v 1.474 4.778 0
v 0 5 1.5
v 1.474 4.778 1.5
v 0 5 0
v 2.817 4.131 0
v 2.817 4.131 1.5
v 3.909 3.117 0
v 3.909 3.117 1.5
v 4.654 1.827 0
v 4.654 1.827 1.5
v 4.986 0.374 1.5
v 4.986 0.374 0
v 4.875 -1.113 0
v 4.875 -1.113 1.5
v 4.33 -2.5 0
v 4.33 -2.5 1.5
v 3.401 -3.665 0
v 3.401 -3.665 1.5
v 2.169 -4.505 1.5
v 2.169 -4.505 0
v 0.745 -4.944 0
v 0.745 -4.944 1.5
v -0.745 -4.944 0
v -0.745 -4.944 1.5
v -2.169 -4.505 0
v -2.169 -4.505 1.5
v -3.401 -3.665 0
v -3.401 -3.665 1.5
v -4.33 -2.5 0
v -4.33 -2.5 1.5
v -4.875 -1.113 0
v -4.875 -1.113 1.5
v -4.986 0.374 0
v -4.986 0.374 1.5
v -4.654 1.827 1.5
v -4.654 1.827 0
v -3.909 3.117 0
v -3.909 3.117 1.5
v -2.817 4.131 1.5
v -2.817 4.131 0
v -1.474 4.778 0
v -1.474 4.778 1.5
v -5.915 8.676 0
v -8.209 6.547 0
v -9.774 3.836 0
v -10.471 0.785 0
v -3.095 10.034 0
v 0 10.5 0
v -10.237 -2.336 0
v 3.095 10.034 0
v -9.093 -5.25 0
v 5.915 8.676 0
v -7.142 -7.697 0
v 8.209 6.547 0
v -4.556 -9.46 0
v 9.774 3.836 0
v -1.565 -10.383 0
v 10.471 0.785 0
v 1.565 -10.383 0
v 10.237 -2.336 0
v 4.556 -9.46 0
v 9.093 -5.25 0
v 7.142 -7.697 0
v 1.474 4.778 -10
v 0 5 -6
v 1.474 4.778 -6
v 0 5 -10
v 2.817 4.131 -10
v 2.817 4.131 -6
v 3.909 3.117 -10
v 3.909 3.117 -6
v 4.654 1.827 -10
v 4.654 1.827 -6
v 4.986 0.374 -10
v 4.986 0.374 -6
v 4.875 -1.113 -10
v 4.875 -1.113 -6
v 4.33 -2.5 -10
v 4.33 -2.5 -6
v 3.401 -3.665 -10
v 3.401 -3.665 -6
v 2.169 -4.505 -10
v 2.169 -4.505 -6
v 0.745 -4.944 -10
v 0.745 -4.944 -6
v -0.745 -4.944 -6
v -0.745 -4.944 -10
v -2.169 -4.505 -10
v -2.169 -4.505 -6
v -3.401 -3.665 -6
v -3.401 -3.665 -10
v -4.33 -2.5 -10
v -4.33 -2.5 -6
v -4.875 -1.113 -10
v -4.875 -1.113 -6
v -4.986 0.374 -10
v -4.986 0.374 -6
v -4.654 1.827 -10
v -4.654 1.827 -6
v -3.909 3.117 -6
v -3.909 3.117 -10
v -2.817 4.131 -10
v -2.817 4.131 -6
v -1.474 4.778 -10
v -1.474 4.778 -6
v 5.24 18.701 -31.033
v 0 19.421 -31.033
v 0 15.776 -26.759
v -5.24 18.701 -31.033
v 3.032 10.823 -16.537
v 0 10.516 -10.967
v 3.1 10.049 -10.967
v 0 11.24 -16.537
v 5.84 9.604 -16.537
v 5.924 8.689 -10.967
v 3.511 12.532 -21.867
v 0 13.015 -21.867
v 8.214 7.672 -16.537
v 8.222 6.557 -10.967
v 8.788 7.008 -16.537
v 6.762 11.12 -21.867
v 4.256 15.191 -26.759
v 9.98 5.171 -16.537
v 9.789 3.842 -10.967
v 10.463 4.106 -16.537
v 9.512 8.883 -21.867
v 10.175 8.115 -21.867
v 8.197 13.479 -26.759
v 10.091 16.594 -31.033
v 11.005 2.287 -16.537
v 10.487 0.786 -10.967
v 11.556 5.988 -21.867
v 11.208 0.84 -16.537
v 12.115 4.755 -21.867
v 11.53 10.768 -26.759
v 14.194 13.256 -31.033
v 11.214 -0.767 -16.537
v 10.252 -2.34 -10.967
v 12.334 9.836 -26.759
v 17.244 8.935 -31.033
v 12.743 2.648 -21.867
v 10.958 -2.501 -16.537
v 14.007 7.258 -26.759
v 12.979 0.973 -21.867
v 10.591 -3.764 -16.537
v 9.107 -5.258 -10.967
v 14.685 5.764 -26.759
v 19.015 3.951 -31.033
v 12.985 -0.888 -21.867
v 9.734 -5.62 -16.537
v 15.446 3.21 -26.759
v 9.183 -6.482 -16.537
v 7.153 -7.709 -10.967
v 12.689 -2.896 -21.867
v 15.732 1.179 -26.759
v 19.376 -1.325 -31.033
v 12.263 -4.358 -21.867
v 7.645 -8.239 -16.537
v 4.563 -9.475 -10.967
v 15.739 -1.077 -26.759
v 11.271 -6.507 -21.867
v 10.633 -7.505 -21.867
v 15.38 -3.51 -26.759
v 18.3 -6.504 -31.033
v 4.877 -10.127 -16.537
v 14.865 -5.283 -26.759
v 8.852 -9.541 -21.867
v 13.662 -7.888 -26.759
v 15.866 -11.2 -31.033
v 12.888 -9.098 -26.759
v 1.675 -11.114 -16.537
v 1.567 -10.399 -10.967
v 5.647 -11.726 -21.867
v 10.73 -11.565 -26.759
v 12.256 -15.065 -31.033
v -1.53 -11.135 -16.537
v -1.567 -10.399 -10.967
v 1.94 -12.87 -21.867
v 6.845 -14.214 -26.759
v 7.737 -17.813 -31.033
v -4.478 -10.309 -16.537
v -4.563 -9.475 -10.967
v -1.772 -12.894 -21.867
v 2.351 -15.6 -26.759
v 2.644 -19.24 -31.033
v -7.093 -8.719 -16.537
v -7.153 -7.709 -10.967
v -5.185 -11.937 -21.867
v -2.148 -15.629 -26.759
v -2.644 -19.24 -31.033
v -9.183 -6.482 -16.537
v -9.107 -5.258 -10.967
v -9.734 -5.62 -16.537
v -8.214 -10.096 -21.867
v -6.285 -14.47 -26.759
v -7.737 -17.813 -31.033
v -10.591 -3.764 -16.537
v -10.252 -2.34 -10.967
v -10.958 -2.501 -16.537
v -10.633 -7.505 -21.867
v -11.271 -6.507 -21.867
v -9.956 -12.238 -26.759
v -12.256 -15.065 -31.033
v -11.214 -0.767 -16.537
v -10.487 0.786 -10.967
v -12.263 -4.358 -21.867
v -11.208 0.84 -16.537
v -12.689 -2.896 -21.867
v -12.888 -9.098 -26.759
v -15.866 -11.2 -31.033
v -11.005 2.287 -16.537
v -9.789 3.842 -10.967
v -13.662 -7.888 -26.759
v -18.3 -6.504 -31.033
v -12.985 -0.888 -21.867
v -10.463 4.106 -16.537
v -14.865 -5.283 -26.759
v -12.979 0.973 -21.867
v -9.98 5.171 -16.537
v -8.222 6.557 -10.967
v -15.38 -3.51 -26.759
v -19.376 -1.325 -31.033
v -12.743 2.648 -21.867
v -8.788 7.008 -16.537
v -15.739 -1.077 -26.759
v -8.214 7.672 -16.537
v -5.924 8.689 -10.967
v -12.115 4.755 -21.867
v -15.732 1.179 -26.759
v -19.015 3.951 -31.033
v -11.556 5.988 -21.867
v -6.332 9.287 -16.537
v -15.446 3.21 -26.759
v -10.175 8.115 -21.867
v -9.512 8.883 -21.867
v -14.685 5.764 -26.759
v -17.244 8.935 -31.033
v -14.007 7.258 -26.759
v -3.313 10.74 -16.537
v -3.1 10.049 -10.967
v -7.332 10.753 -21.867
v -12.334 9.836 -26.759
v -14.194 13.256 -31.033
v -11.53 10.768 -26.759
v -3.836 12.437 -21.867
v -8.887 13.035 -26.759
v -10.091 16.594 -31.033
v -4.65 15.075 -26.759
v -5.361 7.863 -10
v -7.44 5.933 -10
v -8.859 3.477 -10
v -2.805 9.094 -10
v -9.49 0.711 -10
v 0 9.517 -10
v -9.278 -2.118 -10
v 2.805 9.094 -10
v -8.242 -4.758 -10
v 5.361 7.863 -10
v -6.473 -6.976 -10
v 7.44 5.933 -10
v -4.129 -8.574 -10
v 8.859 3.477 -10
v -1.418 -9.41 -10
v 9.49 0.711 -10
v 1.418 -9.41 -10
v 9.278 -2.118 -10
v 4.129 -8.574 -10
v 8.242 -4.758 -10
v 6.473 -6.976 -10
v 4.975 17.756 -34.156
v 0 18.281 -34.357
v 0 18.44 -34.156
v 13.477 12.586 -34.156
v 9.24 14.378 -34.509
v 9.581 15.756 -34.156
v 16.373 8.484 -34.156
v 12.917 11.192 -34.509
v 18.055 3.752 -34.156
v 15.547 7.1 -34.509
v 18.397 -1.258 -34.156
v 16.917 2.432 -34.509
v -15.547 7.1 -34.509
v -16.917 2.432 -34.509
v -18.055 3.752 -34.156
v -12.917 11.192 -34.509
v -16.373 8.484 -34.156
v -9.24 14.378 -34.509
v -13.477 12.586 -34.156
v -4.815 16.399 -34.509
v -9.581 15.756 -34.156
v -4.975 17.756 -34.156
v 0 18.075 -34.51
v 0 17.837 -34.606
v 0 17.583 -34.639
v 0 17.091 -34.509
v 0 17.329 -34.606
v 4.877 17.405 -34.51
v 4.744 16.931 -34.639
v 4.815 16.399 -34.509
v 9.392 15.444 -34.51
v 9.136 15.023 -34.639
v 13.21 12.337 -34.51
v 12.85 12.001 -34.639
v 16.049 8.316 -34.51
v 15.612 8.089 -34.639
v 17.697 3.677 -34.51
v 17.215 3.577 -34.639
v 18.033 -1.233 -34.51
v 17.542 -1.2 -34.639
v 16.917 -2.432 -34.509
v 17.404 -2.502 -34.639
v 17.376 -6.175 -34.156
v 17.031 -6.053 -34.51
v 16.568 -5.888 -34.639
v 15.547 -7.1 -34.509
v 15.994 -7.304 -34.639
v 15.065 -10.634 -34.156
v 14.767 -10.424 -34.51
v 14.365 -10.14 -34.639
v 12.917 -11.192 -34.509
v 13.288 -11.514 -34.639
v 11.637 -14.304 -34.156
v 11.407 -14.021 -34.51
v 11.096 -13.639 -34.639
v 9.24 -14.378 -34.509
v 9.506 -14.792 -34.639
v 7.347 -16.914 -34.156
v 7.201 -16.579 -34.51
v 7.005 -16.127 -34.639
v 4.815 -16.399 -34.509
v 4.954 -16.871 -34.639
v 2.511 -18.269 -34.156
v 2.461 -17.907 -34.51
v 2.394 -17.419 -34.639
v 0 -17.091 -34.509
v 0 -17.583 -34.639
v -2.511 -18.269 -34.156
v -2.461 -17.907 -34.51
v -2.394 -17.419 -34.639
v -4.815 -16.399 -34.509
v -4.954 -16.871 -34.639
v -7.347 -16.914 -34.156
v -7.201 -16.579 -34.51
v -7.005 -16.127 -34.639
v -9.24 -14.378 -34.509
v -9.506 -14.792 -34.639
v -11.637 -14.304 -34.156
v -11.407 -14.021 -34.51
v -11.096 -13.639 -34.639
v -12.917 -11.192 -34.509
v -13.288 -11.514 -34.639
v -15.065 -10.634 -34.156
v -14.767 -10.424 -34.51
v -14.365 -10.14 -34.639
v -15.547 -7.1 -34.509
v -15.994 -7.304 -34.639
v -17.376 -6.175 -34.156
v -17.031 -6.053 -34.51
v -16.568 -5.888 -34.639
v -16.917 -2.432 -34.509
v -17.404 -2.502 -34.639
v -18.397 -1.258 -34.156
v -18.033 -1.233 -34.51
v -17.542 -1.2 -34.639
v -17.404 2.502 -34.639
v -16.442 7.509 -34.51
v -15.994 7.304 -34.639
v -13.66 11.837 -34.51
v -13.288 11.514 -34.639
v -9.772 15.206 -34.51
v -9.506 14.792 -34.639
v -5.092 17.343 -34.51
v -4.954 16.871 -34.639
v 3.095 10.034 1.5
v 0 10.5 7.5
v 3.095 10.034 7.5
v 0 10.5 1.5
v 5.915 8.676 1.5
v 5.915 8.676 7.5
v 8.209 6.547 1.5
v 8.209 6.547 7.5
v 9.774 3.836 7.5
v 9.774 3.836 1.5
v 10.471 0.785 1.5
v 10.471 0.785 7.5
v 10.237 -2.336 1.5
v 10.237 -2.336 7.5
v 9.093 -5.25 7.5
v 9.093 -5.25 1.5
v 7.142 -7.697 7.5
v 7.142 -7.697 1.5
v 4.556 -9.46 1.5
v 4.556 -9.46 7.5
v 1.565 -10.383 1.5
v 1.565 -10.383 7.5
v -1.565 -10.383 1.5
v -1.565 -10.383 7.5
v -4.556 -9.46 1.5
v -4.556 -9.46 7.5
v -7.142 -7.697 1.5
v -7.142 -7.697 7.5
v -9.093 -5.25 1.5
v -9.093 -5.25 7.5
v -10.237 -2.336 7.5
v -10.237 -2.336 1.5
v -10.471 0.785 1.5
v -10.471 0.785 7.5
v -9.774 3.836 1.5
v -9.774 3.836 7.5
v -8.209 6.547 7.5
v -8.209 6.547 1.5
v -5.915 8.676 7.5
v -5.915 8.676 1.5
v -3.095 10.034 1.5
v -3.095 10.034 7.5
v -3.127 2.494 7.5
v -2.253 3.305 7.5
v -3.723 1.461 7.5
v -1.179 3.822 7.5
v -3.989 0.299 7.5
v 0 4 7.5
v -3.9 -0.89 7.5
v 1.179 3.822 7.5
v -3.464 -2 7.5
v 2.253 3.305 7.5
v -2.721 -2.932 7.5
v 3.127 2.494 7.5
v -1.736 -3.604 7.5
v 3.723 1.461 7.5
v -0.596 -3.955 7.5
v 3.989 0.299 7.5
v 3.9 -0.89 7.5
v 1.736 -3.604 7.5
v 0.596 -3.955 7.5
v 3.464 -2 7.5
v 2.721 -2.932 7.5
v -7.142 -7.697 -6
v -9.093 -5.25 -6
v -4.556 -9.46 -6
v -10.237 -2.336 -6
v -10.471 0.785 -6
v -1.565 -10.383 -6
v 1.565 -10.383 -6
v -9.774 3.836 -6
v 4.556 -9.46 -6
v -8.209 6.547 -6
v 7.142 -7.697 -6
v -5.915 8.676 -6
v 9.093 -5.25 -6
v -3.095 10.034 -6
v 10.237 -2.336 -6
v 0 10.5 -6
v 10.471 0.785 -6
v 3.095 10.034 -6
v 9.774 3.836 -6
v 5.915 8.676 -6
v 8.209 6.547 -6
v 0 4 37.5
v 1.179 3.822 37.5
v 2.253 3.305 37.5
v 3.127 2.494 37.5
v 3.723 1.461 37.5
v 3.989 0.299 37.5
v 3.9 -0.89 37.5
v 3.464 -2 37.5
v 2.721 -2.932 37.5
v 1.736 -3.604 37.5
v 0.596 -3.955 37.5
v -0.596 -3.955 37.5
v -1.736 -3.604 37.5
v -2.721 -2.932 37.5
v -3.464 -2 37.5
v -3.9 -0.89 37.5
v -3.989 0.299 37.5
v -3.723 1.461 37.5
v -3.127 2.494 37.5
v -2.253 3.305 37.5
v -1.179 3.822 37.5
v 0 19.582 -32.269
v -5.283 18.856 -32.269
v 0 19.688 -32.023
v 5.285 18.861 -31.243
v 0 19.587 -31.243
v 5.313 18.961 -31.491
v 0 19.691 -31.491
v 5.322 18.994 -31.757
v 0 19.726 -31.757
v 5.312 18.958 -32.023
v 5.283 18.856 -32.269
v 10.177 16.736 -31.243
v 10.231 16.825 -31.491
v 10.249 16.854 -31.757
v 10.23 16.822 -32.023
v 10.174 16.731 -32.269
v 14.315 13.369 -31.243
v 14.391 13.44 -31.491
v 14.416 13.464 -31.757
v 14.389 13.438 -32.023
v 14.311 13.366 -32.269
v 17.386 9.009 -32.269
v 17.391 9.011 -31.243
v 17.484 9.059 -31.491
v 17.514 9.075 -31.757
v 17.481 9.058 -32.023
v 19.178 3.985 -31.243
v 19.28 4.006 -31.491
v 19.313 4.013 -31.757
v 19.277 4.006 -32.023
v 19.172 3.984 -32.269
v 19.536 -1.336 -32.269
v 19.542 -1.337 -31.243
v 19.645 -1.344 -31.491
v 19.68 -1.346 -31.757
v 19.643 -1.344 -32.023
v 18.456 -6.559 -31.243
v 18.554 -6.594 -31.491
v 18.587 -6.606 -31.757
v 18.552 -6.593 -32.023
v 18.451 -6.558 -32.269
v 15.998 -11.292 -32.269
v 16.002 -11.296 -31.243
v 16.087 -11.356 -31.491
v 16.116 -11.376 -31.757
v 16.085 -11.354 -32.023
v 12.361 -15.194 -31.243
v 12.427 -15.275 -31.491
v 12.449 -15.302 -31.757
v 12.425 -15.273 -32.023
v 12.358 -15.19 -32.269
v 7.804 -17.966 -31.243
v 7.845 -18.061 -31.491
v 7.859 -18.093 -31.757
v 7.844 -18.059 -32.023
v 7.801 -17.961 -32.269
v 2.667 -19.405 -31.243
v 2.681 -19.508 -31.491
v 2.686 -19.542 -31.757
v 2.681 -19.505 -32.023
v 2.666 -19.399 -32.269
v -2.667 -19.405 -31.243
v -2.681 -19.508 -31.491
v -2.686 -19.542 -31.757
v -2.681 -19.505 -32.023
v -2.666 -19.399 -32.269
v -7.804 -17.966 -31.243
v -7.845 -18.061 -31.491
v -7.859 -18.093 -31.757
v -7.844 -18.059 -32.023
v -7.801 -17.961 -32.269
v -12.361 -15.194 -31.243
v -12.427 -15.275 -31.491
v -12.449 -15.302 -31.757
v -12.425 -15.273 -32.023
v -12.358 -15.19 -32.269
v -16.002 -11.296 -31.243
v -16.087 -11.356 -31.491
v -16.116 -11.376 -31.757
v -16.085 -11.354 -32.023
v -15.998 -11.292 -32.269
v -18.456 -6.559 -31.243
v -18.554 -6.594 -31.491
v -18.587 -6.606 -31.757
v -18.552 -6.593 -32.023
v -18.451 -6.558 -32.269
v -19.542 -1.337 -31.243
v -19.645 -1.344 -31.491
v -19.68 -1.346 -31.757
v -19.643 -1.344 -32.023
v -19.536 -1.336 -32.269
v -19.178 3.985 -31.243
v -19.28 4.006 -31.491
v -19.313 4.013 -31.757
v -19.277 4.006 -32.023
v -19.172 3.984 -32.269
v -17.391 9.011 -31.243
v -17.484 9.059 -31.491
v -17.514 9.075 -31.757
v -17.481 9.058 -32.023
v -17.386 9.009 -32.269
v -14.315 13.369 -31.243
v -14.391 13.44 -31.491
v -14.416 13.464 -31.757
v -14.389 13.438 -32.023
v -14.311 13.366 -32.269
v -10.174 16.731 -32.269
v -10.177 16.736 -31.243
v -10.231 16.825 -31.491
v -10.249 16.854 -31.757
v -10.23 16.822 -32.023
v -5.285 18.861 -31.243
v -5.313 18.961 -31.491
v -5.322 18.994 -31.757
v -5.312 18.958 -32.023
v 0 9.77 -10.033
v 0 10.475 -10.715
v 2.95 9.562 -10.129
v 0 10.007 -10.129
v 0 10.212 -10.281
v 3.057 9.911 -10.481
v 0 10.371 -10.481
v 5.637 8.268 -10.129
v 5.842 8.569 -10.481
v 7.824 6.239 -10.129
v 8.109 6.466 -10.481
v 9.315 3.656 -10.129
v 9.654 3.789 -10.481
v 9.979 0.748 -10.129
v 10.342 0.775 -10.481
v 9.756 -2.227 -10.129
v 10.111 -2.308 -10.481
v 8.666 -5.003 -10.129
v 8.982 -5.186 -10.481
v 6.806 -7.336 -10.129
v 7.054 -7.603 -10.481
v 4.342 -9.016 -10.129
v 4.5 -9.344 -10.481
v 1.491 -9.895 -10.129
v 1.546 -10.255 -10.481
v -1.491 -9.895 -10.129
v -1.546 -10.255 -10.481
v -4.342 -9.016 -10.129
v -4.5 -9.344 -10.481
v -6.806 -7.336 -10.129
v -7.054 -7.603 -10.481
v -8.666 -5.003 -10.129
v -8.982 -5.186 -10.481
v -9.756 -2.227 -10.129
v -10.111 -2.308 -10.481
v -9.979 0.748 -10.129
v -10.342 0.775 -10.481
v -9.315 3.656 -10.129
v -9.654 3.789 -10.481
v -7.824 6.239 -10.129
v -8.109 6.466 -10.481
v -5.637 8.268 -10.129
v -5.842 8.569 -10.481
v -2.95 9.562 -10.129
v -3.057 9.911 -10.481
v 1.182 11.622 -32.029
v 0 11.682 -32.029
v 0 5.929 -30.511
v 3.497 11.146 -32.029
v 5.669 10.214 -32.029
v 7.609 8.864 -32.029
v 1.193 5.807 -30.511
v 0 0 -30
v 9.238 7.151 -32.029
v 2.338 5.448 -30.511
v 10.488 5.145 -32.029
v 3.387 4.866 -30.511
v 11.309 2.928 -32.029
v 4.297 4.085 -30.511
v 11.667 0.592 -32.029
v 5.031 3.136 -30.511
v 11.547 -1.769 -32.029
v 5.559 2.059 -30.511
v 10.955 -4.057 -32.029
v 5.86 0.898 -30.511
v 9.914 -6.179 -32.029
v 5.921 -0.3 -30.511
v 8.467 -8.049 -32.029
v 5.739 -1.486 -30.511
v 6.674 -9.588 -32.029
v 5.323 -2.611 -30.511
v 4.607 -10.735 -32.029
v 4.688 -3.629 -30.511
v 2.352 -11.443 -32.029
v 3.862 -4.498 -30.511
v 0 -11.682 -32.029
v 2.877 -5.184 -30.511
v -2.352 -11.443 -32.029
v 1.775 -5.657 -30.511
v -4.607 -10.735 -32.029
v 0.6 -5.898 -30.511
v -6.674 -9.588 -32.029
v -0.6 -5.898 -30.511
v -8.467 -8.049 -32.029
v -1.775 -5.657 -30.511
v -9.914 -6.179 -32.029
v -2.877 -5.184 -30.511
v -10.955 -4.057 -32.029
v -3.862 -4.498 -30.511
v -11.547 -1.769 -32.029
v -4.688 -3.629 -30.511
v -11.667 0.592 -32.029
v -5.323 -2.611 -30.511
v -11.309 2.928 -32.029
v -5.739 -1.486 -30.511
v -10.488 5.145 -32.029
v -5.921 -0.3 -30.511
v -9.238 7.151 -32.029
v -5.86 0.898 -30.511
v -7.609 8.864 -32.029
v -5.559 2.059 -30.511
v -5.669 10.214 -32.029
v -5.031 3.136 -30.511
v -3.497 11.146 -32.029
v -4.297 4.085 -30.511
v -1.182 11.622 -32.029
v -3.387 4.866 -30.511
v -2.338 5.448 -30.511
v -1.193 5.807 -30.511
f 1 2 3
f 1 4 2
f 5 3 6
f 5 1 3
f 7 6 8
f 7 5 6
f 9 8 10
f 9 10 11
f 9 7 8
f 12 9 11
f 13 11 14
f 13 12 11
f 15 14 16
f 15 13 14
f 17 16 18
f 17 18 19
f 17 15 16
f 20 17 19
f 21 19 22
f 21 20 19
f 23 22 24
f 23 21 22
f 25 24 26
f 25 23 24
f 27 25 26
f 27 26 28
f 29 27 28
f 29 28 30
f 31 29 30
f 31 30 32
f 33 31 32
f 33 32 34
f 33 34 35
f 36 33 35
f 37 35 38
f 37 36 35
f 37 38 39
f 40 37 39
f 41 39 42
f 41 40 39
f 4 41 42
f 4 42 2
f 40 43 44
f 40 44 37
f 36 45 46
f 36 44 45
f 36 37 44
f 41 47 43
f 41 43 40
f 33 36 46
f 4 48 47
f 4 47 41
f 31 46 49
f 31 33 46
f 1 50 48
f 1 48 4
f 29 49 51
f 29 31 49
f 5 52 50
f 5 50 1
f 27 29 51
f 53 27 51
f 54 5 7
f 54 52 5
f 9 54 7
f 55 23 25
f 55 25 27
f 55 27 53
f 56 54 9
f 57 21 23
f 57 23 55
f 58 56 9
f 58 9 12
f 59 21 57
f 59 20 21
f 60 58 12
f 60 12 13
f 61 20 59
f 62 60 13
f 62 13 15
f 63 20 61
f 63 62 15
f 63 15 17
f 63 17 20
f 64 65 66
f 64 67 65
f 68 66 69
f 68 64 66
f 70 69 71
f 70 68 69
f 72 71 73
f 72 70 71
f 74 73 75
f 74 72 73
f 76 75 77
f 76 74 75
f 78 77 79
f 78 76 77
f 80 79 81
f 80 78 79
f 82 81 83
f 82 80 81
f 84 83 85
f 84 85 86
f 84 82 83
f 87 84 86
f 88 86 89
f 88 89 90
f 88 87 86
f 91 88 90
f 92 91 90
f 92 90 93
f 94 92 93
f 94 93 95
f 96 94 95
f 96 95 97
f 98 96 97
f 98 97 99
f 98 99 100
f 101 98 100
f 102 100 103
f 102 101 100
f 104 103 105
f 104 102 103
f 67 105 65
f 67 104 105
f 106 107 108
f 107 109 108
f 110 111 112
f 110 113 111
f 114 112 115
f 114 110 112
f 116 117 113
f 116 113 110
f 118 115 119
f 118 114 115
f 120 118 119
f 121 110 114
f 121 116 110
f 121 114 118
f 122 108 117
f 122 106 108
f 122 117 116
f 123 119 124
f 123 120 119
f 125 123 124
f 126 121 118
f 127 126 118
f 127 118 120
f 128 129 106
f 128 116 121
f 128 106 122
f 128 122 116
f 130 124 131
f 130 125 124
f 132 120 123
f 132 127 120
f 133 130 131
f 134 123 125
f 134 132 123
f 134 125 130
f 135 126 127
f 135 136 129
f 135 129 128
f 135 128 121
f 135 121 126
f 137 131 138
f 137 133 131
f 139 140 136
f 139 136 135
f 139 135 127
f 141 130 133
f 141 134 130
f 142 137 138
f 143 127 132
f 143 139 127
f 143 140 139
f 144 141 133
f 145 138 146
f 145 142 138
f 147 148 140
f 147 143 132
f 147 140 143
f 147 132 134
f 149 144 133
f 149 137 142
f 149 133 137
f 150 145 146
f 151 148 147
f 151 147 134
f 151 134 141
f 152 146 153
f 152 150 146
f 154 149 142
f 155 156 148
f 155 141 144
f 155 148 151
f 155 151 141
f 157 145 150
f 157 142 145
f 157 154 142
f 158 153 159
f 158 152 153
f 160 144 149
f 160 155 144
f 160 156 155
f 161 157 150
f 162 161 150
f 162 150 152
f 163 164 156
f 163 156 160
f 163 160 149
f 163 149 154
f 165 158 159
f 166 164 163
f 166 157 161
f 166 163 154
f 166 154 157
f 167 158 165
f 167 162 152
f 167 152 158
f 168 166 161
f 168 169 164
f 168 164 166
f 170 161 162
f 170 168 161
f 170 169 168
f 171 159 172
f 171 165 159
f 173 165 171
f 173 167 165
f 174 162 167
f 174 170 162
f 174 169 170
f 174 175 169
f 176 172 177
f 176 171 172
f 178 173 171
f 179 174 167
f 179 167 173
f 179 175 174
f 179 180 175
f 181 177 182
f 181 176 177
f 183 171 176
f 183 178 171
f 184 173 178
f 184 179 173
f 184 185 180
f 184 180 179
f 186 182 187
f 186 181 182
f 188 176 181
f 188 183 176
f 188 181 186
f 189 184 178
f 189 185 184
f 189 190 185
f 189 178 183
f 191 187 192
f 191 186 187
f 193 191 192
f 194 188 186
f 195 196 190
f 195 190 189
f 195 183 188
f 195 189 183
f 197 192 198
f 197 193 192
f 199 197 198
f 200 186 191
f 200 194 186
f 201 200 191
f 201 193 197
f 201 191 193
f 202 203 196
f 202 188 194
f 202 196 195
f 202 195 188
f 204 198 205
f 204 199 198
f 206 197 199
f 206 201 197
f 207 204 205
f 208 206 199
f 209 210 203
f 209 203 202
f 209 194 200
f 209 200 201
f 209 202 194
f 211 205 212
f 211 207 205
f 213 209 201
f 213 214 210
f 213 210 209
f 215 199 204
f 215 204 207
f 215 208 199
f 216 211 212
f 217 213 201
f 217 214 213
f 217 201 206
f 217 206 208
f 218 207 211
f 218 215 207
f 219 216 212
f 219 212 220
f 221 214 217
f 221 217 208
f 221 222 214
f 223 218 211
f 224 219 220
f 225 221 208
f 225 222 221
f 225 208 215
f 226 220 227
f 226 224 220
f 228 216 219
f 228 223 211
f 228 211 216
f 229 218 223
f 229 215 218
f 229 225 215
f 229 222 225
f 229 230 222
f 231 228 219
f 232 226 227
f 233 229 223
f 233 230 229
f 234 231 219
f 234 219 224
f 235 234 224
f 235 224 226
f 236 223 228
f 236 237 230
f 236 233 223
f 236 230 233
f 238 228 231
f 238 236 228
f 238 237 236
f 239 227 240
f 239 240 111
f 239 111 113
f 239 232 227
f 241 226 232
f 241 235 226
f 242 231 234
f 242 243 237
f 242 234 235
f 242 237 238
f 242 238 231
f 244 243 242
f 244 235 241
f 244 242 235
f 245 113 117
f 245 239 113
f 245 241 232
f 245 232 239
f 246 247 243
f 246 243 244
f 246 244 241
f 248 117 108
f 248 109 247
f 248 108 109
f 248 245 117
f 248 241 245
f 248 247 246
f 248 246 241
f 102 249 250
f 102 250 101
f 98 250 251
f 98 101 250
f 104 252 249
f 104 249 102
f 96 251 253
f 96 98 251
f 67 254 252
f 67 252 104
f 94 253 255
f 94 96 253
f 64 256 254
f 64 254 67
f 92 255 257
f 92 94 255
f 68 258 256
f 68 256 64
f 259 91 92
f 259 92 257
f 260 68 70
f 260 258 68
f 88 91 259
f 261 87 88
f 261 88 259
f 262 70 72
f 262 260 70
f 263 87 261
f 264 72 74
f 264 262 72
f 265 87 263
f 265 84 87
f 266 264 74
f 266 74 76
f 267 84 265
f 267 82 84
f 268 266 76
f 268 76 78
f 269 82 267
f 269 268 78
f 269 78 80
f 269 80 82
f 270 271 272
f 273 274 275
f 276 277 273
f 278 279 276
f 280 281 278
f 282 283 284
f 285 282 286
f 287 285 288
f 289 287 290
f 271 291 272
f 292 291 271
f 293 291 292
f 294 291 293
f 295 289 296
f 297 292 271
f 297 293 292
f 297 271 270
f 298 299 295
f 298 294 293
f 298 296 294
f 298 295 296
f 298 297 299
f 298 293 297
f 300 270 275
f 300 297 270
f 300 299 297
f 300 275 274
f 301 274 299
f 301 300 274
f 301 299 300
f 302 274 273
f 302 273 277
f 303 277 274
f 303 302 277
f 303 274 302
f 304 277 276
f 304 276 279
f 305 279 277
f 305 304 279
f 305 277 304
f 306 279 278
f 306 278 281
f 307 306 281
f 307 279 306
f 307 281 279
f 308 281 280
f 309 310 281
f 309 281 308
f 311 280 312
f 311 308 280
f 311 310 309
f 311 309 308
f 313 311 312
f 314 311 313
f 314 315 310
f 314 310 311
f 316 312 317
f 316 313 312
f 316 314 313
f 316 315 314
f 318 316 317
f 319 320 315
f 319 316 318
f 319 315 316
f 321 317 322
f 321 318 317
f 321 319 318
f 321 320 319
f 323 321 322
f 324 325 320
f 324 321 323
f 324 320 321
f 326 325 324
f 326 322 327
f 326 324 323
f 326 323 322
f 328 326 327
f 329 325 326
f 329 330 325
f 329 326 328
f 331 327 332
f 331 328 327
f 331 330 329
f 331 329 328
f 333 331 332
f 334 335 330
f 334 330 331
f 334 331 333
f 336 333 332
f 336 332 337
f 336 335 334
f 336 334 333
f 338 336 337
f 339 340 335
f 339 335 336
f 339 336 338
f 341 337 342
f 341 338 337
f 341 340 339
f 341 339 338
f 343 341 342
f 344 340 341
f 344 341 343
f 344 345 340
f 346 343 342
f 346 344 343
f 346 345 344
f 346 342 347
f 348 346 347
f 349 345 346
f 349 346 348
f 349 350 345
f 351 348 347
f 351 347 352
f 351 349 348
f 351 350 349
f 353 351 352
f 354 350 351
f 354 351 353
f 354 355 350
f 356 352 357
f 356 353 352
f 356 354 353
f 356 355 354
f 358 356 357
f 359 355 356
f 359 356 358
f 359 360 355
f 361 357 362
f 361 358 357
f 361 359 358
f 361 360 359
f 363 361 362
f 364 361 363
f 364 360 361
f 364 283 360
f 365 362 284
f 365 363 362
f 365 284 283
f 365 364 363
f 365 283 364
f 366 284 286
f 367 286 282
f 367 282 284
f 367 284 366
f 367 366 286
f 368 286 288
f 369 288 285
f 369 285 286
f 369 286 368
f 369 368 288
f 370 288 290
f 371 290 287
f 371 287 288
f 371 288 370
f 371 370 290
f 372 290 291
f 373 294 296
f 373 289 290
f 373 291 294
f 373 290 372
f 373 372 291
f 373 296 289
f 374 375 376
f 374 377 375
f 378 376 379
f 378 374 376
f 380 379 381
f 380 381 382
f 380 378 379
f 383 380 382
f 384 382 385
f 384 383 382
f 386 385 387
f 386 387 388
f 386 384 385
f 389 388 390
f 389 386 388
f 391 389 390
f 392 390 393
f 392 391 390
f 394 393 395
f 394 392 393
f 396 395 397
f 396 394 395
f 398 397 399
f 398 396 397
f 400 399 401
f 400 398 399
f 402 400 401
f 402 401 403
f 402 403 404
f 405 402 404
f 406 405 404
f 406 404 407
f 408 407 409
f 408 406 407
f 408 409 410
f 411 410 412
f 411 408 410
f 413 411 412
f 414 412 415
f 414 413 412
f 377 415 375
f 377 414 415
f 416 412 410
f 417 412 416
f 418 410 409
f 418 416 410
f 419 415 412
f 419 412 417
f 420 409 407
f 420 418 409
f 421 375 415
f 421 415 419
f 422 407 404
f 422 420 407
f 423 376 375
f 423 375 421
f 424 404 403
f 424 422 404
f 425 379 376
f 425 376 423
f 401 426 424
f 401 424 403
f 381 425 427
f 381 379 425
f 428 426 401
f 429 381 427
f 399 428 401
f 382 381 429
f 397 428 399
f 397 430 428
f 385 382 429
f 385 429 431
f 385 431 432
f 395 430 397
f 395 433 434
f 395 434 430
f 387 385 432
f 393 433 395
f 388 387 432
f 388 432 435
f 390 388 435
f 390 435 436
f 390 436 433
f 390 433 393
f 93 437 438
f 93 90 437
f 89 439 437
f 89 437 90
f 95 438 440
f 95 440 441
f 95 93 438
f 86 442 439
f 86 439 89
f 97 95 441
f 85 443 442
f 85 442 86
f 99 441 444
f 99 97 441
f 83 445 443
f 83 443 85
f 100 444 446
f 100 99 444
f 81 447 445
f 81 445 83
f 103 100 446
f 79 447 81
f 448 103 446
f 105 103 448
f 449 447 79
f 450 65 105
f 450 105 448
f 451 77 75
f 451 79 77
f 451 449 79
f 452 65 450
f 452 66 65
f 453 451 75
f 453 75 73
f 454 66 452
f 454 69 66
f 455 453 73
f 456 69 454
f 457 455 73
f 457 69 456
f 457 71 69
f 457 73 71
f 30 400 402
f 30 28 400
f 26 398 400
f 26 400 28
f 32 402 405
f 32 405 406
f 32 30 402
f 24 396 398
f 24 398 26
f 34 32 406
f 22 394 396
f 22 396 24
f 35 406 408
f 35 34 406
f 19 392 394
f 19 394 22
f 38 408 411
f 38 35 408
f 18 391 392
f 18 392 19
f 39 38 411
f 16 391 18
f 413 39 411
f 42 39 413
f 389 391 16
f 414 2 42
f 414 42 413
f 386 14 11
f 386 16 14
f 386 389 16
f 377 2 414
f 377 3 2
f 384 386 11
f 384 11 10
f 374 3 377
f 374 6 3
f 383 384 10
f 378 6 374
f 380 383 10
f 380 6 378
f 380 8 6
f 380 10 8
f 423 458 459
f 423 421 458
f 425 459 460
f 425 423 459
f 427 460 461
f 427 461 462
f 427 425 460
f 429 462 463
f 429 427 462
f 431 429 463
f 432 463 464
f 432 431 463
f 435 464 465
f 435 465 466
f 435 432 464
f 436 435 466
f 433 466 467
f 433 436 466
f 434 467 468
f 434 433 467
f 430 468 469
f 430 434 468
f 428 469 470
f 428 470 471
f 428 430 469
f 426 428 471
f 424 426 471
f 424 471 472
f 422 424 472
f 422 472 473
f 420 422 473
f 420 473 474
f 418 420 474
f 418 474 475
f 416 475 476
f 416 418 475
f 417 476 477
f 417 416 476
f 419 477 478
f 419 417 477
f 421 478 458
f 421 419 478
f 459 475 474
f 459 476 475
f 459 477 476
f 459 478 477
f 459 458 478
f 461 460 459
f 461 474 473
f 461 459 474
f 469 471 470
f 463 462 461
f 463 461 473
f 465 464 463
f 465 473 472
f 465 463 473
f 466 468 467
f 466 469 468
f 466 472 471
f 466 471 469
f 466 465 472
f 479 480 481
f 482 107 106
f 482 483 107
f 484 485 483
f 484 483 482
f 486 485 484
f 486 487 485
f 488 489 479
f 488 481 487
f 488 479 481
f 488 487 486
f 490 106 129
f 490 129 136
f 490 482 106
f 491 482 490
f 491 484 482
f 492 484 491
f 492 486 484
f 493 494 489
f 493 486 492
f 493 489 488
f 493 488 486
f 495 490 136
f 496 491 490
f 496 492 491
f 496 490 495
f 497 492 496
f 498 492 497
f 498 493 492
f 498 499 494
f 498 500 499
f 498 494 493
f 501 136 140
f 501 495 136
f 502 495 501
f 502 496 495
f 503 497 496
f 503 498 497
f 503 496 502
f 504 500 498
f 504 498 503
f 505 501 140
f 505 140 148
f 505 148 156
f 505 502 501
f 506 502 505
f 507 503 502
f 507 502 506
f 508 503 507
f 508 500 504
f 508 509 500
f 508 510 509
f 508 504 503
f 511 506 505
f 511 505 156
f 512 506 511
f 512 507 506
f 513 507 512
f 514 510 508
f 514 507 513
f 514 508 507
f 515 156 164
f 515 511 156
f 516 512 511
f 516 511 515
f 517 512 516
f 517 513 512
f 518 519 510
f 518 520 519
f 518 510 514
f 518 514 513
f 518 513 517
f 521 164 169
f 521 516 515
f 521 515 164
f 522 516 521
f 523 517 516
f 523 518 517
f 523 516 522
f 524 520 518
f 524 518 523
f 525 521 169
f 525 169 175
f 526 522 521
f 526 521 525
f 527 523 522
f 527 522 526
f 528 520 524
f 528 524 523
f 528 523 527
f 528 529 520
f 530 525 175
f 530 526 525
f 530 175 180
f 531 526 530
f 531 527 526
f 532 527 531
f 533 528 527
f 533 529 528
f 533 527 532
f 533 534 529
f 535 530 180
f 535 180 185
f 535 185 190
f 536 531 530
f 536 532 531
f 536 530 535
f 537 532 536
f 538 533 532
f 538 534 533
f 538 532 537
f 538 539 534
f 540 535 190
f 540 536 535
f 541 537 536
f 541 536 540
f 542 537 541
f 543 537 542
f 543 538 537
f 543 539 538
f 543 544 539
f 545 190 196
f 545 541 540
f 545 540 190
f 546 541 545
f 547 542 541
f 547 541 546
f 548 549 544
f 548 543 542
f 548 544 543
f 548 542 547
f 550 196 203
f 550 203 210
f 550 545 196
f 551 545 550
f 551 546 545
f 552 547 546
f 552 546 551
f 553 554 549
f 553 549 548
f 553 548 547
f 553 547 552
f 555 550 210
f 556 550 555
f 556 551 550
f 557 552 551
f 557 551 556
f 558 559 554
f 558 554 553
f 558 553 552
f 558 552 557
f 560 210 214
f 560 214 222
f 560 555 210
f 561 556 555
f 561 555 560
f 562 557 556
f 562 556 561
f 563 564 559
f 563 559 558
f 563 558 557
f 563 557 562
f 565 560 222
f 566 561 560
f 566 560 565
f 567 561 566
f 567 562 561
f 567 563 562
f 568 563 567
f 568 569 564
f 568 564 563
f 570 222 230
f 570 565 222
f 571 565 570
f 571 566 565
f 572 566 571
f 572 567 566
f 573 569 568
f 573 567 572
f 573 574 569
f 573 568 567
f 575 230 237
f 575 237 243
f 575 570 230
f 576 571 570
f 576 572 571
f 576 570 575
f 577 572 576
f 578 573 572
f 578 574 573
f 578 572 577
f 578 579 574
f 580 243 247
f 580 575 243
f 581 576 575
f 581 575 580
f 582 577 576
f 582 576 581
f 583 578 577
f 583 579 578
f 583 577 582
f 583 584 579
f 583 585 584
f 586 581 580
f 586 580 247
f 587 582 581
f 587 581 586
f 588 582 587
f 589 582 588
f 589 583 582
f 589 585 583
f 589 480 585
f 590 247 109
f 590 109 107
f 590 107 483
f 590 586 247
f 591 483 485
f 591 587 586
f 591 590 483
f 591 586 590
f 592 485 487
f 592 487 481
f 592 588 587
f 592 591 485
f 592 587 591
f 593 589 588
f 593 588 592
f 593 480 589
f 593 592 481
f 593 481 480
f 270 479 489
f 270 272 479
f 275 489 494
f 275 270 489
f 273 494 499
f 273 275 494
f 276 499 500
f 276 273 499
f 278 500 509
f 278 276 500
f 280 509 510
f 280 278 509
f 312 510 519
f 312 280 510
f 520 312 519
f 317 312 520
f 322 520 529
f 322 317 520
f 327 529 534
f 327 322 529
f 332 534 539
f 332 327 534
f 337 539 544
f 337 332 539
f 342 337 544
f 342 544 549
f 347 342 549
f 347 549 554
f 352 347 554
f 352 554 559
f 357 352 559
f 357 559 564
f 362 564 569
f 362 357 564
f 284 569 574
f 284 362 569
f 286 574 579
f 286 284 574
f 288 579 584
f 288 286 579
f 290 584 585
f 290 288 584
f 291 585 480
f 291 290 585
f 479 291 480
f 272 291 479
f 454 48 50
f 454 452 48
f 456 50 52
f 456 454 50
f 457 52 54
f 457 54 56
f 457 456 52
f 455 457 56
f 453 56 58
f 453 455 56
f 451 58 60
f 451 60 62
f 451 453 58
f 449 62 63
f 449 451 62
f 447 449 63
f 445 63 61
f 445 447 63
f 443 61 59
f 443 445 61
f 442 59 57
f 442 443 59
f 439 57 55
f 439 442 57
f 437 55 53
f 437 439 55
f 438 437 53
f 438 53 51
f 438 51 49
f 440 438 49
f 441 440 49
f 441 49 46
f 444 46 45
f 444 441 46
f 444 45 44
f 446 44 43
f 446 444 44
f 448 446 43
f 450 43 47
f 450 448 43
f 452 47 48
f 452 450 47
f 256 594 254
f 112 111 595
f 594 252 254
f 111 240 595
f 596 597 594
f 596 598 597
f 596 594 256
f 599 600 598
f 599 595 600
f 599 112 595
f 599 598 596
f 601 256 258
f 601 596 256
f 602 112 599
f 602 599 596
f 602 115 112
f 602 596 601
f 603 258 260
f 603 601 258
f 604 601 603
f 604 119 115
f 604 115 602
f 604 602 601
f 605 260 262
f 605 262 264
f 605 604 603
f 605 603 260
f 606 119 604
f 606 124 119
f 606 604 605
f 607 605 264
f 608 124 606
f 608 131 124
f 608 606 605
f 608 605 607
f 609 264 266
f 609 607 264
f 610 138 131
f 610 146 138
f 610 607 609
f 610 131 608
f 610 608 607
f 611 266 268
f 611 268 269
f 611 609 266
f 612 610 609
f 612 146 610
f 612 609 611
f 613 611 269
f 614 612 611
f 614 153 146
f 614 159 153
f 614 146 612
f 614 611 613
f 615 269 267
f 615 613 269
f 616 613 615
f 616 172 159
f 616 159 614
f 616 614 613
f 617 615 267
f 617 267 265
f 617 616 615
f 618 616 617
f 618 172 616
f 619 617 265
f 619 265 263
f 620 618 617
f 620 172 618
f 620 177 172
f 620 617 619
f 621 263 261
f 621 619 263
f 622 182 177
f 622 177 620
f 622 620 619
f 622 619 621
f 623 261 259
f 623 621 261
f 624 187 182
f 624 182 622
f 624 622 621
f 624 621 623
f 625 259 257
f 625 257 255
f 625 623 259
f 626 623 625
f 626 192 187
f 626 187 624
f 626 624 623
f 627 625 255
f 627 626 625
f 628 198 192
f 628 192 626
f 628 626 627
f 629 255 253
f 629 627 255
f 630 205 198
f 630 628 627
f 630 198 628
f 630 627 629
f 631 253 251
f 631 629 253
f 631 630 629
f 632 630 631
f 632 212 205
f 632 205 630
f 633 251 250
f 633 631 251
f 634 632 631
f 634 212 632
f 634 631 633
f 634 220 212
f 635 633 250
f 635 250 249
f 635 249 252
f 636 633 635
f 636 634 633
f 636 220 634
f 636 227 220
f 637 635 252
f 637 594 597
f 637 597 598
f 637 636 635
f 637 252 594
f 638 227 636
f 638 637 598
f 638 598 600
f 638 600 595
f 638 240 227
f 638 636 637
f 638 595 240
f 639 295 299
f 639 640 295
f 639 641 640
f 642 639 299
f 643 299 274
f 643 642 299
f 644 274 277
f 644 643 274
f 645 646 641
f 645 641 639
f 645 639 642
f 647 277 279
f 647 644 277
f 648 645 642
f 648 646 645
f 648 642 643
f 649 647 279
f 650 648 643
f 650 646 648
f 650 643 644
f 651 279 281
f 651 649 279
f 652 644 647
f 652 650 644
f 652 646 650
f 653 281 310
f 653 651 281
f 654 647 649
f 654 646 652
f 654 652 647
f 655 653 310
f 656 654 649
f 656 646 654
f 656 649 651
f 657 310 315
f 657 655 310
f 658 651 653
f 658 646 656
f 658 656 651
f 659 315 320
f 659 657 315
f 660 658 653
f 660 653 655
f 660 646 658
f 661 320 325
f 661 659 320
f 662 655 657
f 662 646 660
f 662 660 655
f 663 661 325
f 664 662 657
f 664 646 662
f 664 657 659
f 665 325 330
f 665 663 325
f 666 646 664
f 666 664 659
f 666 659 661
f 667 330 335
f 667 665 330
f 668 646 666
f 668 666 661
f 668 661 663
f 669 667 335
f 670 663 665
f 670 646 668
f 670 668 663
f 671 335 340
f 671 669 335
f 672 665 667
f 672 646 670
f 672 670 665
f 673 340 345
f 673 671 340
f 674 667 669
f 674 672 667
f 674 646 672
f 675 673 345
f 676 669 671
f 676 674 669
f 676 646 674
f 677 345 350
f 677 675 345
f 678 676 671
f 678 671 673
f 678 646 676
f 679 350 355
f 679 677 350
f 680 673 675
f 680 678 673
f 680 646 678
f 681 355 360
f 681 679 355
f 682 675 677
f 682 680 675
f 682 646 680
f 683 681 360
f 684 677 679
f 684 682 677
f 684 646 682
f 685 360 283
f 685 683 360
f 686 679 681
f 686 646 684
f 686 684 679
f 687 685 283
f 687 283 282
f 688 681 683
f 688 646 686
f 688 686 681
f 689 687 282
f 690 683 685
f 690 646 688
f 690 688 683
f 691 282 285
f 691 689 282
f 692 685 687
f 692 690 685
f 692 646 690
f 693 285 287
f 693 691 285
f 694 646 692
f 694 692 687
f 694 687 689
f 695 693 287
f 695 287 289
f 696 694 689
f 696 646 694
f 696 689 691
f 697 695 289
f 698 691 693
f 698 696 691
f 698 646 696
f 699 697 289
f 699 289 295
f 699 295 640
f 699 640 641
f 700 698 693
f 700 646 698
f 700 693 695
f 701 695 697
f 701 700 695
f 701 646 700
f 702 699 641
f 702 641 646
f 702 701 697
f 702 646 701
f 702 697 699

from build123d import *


with BuildPart() as part:
    # Эскиз1 → Повернуть1 (revolve)
    with BuildSketch(Plane(origin=(0, 0, 0), x_dir=(0, 0, -1), z_dir=(1, 0, 0))):
        with BuildLine():
            Line((-37.5, 0), (-37.5, 4))
            Line((-37.5, 4), (-7.5, 4))
            Line((-7.5, 4), (-7.5, 10.5))
            Line((-7.5, 10.5), (-1.5, 10.5))
            Line((-1.5, 10.5), (-1.5, 5))
            Line((-1.5, 5), (0, 5))
            Line((0, 5), (0, 10.5))
            Line((0, 10.5), (6, 10.5))
            Line((6, 10.5), (6, 5))
            Line((6, 5), (10, 5))
            Line((10, 5), (10, 9.516531243))
            ThreePointArc((10, 9.516531243), (10.281302062, 10.211853667), (10.966946547, 10.515984828))
            ThreePointArc((10.966946547, 10.515984828), (21.86672187, 13.014935813), (31.032522672, 19.421023056))
            ThreePointArc((31.032522672, 19.421023056), (31.622642119, 19.717638439), (32.268965333, 19.581668037))
            Line((32.268965333, 19.581668037), (34.156309404, 18.440297549))
            ThreePointArc((34.156309404, 18.440297549), (34.606360099, 17.837352598), (34.508702483, 17.091328984))
            ThreePointArc((34.508702483, 17.091328984), (31.146131827, 8.838013416), (30, 0))
            Line((30, 0), (-37.5, 0))
        make_face()
    revolve(axis=Axis((0, 0, 37.5), (0, 0, -1)))


solid = part.part
